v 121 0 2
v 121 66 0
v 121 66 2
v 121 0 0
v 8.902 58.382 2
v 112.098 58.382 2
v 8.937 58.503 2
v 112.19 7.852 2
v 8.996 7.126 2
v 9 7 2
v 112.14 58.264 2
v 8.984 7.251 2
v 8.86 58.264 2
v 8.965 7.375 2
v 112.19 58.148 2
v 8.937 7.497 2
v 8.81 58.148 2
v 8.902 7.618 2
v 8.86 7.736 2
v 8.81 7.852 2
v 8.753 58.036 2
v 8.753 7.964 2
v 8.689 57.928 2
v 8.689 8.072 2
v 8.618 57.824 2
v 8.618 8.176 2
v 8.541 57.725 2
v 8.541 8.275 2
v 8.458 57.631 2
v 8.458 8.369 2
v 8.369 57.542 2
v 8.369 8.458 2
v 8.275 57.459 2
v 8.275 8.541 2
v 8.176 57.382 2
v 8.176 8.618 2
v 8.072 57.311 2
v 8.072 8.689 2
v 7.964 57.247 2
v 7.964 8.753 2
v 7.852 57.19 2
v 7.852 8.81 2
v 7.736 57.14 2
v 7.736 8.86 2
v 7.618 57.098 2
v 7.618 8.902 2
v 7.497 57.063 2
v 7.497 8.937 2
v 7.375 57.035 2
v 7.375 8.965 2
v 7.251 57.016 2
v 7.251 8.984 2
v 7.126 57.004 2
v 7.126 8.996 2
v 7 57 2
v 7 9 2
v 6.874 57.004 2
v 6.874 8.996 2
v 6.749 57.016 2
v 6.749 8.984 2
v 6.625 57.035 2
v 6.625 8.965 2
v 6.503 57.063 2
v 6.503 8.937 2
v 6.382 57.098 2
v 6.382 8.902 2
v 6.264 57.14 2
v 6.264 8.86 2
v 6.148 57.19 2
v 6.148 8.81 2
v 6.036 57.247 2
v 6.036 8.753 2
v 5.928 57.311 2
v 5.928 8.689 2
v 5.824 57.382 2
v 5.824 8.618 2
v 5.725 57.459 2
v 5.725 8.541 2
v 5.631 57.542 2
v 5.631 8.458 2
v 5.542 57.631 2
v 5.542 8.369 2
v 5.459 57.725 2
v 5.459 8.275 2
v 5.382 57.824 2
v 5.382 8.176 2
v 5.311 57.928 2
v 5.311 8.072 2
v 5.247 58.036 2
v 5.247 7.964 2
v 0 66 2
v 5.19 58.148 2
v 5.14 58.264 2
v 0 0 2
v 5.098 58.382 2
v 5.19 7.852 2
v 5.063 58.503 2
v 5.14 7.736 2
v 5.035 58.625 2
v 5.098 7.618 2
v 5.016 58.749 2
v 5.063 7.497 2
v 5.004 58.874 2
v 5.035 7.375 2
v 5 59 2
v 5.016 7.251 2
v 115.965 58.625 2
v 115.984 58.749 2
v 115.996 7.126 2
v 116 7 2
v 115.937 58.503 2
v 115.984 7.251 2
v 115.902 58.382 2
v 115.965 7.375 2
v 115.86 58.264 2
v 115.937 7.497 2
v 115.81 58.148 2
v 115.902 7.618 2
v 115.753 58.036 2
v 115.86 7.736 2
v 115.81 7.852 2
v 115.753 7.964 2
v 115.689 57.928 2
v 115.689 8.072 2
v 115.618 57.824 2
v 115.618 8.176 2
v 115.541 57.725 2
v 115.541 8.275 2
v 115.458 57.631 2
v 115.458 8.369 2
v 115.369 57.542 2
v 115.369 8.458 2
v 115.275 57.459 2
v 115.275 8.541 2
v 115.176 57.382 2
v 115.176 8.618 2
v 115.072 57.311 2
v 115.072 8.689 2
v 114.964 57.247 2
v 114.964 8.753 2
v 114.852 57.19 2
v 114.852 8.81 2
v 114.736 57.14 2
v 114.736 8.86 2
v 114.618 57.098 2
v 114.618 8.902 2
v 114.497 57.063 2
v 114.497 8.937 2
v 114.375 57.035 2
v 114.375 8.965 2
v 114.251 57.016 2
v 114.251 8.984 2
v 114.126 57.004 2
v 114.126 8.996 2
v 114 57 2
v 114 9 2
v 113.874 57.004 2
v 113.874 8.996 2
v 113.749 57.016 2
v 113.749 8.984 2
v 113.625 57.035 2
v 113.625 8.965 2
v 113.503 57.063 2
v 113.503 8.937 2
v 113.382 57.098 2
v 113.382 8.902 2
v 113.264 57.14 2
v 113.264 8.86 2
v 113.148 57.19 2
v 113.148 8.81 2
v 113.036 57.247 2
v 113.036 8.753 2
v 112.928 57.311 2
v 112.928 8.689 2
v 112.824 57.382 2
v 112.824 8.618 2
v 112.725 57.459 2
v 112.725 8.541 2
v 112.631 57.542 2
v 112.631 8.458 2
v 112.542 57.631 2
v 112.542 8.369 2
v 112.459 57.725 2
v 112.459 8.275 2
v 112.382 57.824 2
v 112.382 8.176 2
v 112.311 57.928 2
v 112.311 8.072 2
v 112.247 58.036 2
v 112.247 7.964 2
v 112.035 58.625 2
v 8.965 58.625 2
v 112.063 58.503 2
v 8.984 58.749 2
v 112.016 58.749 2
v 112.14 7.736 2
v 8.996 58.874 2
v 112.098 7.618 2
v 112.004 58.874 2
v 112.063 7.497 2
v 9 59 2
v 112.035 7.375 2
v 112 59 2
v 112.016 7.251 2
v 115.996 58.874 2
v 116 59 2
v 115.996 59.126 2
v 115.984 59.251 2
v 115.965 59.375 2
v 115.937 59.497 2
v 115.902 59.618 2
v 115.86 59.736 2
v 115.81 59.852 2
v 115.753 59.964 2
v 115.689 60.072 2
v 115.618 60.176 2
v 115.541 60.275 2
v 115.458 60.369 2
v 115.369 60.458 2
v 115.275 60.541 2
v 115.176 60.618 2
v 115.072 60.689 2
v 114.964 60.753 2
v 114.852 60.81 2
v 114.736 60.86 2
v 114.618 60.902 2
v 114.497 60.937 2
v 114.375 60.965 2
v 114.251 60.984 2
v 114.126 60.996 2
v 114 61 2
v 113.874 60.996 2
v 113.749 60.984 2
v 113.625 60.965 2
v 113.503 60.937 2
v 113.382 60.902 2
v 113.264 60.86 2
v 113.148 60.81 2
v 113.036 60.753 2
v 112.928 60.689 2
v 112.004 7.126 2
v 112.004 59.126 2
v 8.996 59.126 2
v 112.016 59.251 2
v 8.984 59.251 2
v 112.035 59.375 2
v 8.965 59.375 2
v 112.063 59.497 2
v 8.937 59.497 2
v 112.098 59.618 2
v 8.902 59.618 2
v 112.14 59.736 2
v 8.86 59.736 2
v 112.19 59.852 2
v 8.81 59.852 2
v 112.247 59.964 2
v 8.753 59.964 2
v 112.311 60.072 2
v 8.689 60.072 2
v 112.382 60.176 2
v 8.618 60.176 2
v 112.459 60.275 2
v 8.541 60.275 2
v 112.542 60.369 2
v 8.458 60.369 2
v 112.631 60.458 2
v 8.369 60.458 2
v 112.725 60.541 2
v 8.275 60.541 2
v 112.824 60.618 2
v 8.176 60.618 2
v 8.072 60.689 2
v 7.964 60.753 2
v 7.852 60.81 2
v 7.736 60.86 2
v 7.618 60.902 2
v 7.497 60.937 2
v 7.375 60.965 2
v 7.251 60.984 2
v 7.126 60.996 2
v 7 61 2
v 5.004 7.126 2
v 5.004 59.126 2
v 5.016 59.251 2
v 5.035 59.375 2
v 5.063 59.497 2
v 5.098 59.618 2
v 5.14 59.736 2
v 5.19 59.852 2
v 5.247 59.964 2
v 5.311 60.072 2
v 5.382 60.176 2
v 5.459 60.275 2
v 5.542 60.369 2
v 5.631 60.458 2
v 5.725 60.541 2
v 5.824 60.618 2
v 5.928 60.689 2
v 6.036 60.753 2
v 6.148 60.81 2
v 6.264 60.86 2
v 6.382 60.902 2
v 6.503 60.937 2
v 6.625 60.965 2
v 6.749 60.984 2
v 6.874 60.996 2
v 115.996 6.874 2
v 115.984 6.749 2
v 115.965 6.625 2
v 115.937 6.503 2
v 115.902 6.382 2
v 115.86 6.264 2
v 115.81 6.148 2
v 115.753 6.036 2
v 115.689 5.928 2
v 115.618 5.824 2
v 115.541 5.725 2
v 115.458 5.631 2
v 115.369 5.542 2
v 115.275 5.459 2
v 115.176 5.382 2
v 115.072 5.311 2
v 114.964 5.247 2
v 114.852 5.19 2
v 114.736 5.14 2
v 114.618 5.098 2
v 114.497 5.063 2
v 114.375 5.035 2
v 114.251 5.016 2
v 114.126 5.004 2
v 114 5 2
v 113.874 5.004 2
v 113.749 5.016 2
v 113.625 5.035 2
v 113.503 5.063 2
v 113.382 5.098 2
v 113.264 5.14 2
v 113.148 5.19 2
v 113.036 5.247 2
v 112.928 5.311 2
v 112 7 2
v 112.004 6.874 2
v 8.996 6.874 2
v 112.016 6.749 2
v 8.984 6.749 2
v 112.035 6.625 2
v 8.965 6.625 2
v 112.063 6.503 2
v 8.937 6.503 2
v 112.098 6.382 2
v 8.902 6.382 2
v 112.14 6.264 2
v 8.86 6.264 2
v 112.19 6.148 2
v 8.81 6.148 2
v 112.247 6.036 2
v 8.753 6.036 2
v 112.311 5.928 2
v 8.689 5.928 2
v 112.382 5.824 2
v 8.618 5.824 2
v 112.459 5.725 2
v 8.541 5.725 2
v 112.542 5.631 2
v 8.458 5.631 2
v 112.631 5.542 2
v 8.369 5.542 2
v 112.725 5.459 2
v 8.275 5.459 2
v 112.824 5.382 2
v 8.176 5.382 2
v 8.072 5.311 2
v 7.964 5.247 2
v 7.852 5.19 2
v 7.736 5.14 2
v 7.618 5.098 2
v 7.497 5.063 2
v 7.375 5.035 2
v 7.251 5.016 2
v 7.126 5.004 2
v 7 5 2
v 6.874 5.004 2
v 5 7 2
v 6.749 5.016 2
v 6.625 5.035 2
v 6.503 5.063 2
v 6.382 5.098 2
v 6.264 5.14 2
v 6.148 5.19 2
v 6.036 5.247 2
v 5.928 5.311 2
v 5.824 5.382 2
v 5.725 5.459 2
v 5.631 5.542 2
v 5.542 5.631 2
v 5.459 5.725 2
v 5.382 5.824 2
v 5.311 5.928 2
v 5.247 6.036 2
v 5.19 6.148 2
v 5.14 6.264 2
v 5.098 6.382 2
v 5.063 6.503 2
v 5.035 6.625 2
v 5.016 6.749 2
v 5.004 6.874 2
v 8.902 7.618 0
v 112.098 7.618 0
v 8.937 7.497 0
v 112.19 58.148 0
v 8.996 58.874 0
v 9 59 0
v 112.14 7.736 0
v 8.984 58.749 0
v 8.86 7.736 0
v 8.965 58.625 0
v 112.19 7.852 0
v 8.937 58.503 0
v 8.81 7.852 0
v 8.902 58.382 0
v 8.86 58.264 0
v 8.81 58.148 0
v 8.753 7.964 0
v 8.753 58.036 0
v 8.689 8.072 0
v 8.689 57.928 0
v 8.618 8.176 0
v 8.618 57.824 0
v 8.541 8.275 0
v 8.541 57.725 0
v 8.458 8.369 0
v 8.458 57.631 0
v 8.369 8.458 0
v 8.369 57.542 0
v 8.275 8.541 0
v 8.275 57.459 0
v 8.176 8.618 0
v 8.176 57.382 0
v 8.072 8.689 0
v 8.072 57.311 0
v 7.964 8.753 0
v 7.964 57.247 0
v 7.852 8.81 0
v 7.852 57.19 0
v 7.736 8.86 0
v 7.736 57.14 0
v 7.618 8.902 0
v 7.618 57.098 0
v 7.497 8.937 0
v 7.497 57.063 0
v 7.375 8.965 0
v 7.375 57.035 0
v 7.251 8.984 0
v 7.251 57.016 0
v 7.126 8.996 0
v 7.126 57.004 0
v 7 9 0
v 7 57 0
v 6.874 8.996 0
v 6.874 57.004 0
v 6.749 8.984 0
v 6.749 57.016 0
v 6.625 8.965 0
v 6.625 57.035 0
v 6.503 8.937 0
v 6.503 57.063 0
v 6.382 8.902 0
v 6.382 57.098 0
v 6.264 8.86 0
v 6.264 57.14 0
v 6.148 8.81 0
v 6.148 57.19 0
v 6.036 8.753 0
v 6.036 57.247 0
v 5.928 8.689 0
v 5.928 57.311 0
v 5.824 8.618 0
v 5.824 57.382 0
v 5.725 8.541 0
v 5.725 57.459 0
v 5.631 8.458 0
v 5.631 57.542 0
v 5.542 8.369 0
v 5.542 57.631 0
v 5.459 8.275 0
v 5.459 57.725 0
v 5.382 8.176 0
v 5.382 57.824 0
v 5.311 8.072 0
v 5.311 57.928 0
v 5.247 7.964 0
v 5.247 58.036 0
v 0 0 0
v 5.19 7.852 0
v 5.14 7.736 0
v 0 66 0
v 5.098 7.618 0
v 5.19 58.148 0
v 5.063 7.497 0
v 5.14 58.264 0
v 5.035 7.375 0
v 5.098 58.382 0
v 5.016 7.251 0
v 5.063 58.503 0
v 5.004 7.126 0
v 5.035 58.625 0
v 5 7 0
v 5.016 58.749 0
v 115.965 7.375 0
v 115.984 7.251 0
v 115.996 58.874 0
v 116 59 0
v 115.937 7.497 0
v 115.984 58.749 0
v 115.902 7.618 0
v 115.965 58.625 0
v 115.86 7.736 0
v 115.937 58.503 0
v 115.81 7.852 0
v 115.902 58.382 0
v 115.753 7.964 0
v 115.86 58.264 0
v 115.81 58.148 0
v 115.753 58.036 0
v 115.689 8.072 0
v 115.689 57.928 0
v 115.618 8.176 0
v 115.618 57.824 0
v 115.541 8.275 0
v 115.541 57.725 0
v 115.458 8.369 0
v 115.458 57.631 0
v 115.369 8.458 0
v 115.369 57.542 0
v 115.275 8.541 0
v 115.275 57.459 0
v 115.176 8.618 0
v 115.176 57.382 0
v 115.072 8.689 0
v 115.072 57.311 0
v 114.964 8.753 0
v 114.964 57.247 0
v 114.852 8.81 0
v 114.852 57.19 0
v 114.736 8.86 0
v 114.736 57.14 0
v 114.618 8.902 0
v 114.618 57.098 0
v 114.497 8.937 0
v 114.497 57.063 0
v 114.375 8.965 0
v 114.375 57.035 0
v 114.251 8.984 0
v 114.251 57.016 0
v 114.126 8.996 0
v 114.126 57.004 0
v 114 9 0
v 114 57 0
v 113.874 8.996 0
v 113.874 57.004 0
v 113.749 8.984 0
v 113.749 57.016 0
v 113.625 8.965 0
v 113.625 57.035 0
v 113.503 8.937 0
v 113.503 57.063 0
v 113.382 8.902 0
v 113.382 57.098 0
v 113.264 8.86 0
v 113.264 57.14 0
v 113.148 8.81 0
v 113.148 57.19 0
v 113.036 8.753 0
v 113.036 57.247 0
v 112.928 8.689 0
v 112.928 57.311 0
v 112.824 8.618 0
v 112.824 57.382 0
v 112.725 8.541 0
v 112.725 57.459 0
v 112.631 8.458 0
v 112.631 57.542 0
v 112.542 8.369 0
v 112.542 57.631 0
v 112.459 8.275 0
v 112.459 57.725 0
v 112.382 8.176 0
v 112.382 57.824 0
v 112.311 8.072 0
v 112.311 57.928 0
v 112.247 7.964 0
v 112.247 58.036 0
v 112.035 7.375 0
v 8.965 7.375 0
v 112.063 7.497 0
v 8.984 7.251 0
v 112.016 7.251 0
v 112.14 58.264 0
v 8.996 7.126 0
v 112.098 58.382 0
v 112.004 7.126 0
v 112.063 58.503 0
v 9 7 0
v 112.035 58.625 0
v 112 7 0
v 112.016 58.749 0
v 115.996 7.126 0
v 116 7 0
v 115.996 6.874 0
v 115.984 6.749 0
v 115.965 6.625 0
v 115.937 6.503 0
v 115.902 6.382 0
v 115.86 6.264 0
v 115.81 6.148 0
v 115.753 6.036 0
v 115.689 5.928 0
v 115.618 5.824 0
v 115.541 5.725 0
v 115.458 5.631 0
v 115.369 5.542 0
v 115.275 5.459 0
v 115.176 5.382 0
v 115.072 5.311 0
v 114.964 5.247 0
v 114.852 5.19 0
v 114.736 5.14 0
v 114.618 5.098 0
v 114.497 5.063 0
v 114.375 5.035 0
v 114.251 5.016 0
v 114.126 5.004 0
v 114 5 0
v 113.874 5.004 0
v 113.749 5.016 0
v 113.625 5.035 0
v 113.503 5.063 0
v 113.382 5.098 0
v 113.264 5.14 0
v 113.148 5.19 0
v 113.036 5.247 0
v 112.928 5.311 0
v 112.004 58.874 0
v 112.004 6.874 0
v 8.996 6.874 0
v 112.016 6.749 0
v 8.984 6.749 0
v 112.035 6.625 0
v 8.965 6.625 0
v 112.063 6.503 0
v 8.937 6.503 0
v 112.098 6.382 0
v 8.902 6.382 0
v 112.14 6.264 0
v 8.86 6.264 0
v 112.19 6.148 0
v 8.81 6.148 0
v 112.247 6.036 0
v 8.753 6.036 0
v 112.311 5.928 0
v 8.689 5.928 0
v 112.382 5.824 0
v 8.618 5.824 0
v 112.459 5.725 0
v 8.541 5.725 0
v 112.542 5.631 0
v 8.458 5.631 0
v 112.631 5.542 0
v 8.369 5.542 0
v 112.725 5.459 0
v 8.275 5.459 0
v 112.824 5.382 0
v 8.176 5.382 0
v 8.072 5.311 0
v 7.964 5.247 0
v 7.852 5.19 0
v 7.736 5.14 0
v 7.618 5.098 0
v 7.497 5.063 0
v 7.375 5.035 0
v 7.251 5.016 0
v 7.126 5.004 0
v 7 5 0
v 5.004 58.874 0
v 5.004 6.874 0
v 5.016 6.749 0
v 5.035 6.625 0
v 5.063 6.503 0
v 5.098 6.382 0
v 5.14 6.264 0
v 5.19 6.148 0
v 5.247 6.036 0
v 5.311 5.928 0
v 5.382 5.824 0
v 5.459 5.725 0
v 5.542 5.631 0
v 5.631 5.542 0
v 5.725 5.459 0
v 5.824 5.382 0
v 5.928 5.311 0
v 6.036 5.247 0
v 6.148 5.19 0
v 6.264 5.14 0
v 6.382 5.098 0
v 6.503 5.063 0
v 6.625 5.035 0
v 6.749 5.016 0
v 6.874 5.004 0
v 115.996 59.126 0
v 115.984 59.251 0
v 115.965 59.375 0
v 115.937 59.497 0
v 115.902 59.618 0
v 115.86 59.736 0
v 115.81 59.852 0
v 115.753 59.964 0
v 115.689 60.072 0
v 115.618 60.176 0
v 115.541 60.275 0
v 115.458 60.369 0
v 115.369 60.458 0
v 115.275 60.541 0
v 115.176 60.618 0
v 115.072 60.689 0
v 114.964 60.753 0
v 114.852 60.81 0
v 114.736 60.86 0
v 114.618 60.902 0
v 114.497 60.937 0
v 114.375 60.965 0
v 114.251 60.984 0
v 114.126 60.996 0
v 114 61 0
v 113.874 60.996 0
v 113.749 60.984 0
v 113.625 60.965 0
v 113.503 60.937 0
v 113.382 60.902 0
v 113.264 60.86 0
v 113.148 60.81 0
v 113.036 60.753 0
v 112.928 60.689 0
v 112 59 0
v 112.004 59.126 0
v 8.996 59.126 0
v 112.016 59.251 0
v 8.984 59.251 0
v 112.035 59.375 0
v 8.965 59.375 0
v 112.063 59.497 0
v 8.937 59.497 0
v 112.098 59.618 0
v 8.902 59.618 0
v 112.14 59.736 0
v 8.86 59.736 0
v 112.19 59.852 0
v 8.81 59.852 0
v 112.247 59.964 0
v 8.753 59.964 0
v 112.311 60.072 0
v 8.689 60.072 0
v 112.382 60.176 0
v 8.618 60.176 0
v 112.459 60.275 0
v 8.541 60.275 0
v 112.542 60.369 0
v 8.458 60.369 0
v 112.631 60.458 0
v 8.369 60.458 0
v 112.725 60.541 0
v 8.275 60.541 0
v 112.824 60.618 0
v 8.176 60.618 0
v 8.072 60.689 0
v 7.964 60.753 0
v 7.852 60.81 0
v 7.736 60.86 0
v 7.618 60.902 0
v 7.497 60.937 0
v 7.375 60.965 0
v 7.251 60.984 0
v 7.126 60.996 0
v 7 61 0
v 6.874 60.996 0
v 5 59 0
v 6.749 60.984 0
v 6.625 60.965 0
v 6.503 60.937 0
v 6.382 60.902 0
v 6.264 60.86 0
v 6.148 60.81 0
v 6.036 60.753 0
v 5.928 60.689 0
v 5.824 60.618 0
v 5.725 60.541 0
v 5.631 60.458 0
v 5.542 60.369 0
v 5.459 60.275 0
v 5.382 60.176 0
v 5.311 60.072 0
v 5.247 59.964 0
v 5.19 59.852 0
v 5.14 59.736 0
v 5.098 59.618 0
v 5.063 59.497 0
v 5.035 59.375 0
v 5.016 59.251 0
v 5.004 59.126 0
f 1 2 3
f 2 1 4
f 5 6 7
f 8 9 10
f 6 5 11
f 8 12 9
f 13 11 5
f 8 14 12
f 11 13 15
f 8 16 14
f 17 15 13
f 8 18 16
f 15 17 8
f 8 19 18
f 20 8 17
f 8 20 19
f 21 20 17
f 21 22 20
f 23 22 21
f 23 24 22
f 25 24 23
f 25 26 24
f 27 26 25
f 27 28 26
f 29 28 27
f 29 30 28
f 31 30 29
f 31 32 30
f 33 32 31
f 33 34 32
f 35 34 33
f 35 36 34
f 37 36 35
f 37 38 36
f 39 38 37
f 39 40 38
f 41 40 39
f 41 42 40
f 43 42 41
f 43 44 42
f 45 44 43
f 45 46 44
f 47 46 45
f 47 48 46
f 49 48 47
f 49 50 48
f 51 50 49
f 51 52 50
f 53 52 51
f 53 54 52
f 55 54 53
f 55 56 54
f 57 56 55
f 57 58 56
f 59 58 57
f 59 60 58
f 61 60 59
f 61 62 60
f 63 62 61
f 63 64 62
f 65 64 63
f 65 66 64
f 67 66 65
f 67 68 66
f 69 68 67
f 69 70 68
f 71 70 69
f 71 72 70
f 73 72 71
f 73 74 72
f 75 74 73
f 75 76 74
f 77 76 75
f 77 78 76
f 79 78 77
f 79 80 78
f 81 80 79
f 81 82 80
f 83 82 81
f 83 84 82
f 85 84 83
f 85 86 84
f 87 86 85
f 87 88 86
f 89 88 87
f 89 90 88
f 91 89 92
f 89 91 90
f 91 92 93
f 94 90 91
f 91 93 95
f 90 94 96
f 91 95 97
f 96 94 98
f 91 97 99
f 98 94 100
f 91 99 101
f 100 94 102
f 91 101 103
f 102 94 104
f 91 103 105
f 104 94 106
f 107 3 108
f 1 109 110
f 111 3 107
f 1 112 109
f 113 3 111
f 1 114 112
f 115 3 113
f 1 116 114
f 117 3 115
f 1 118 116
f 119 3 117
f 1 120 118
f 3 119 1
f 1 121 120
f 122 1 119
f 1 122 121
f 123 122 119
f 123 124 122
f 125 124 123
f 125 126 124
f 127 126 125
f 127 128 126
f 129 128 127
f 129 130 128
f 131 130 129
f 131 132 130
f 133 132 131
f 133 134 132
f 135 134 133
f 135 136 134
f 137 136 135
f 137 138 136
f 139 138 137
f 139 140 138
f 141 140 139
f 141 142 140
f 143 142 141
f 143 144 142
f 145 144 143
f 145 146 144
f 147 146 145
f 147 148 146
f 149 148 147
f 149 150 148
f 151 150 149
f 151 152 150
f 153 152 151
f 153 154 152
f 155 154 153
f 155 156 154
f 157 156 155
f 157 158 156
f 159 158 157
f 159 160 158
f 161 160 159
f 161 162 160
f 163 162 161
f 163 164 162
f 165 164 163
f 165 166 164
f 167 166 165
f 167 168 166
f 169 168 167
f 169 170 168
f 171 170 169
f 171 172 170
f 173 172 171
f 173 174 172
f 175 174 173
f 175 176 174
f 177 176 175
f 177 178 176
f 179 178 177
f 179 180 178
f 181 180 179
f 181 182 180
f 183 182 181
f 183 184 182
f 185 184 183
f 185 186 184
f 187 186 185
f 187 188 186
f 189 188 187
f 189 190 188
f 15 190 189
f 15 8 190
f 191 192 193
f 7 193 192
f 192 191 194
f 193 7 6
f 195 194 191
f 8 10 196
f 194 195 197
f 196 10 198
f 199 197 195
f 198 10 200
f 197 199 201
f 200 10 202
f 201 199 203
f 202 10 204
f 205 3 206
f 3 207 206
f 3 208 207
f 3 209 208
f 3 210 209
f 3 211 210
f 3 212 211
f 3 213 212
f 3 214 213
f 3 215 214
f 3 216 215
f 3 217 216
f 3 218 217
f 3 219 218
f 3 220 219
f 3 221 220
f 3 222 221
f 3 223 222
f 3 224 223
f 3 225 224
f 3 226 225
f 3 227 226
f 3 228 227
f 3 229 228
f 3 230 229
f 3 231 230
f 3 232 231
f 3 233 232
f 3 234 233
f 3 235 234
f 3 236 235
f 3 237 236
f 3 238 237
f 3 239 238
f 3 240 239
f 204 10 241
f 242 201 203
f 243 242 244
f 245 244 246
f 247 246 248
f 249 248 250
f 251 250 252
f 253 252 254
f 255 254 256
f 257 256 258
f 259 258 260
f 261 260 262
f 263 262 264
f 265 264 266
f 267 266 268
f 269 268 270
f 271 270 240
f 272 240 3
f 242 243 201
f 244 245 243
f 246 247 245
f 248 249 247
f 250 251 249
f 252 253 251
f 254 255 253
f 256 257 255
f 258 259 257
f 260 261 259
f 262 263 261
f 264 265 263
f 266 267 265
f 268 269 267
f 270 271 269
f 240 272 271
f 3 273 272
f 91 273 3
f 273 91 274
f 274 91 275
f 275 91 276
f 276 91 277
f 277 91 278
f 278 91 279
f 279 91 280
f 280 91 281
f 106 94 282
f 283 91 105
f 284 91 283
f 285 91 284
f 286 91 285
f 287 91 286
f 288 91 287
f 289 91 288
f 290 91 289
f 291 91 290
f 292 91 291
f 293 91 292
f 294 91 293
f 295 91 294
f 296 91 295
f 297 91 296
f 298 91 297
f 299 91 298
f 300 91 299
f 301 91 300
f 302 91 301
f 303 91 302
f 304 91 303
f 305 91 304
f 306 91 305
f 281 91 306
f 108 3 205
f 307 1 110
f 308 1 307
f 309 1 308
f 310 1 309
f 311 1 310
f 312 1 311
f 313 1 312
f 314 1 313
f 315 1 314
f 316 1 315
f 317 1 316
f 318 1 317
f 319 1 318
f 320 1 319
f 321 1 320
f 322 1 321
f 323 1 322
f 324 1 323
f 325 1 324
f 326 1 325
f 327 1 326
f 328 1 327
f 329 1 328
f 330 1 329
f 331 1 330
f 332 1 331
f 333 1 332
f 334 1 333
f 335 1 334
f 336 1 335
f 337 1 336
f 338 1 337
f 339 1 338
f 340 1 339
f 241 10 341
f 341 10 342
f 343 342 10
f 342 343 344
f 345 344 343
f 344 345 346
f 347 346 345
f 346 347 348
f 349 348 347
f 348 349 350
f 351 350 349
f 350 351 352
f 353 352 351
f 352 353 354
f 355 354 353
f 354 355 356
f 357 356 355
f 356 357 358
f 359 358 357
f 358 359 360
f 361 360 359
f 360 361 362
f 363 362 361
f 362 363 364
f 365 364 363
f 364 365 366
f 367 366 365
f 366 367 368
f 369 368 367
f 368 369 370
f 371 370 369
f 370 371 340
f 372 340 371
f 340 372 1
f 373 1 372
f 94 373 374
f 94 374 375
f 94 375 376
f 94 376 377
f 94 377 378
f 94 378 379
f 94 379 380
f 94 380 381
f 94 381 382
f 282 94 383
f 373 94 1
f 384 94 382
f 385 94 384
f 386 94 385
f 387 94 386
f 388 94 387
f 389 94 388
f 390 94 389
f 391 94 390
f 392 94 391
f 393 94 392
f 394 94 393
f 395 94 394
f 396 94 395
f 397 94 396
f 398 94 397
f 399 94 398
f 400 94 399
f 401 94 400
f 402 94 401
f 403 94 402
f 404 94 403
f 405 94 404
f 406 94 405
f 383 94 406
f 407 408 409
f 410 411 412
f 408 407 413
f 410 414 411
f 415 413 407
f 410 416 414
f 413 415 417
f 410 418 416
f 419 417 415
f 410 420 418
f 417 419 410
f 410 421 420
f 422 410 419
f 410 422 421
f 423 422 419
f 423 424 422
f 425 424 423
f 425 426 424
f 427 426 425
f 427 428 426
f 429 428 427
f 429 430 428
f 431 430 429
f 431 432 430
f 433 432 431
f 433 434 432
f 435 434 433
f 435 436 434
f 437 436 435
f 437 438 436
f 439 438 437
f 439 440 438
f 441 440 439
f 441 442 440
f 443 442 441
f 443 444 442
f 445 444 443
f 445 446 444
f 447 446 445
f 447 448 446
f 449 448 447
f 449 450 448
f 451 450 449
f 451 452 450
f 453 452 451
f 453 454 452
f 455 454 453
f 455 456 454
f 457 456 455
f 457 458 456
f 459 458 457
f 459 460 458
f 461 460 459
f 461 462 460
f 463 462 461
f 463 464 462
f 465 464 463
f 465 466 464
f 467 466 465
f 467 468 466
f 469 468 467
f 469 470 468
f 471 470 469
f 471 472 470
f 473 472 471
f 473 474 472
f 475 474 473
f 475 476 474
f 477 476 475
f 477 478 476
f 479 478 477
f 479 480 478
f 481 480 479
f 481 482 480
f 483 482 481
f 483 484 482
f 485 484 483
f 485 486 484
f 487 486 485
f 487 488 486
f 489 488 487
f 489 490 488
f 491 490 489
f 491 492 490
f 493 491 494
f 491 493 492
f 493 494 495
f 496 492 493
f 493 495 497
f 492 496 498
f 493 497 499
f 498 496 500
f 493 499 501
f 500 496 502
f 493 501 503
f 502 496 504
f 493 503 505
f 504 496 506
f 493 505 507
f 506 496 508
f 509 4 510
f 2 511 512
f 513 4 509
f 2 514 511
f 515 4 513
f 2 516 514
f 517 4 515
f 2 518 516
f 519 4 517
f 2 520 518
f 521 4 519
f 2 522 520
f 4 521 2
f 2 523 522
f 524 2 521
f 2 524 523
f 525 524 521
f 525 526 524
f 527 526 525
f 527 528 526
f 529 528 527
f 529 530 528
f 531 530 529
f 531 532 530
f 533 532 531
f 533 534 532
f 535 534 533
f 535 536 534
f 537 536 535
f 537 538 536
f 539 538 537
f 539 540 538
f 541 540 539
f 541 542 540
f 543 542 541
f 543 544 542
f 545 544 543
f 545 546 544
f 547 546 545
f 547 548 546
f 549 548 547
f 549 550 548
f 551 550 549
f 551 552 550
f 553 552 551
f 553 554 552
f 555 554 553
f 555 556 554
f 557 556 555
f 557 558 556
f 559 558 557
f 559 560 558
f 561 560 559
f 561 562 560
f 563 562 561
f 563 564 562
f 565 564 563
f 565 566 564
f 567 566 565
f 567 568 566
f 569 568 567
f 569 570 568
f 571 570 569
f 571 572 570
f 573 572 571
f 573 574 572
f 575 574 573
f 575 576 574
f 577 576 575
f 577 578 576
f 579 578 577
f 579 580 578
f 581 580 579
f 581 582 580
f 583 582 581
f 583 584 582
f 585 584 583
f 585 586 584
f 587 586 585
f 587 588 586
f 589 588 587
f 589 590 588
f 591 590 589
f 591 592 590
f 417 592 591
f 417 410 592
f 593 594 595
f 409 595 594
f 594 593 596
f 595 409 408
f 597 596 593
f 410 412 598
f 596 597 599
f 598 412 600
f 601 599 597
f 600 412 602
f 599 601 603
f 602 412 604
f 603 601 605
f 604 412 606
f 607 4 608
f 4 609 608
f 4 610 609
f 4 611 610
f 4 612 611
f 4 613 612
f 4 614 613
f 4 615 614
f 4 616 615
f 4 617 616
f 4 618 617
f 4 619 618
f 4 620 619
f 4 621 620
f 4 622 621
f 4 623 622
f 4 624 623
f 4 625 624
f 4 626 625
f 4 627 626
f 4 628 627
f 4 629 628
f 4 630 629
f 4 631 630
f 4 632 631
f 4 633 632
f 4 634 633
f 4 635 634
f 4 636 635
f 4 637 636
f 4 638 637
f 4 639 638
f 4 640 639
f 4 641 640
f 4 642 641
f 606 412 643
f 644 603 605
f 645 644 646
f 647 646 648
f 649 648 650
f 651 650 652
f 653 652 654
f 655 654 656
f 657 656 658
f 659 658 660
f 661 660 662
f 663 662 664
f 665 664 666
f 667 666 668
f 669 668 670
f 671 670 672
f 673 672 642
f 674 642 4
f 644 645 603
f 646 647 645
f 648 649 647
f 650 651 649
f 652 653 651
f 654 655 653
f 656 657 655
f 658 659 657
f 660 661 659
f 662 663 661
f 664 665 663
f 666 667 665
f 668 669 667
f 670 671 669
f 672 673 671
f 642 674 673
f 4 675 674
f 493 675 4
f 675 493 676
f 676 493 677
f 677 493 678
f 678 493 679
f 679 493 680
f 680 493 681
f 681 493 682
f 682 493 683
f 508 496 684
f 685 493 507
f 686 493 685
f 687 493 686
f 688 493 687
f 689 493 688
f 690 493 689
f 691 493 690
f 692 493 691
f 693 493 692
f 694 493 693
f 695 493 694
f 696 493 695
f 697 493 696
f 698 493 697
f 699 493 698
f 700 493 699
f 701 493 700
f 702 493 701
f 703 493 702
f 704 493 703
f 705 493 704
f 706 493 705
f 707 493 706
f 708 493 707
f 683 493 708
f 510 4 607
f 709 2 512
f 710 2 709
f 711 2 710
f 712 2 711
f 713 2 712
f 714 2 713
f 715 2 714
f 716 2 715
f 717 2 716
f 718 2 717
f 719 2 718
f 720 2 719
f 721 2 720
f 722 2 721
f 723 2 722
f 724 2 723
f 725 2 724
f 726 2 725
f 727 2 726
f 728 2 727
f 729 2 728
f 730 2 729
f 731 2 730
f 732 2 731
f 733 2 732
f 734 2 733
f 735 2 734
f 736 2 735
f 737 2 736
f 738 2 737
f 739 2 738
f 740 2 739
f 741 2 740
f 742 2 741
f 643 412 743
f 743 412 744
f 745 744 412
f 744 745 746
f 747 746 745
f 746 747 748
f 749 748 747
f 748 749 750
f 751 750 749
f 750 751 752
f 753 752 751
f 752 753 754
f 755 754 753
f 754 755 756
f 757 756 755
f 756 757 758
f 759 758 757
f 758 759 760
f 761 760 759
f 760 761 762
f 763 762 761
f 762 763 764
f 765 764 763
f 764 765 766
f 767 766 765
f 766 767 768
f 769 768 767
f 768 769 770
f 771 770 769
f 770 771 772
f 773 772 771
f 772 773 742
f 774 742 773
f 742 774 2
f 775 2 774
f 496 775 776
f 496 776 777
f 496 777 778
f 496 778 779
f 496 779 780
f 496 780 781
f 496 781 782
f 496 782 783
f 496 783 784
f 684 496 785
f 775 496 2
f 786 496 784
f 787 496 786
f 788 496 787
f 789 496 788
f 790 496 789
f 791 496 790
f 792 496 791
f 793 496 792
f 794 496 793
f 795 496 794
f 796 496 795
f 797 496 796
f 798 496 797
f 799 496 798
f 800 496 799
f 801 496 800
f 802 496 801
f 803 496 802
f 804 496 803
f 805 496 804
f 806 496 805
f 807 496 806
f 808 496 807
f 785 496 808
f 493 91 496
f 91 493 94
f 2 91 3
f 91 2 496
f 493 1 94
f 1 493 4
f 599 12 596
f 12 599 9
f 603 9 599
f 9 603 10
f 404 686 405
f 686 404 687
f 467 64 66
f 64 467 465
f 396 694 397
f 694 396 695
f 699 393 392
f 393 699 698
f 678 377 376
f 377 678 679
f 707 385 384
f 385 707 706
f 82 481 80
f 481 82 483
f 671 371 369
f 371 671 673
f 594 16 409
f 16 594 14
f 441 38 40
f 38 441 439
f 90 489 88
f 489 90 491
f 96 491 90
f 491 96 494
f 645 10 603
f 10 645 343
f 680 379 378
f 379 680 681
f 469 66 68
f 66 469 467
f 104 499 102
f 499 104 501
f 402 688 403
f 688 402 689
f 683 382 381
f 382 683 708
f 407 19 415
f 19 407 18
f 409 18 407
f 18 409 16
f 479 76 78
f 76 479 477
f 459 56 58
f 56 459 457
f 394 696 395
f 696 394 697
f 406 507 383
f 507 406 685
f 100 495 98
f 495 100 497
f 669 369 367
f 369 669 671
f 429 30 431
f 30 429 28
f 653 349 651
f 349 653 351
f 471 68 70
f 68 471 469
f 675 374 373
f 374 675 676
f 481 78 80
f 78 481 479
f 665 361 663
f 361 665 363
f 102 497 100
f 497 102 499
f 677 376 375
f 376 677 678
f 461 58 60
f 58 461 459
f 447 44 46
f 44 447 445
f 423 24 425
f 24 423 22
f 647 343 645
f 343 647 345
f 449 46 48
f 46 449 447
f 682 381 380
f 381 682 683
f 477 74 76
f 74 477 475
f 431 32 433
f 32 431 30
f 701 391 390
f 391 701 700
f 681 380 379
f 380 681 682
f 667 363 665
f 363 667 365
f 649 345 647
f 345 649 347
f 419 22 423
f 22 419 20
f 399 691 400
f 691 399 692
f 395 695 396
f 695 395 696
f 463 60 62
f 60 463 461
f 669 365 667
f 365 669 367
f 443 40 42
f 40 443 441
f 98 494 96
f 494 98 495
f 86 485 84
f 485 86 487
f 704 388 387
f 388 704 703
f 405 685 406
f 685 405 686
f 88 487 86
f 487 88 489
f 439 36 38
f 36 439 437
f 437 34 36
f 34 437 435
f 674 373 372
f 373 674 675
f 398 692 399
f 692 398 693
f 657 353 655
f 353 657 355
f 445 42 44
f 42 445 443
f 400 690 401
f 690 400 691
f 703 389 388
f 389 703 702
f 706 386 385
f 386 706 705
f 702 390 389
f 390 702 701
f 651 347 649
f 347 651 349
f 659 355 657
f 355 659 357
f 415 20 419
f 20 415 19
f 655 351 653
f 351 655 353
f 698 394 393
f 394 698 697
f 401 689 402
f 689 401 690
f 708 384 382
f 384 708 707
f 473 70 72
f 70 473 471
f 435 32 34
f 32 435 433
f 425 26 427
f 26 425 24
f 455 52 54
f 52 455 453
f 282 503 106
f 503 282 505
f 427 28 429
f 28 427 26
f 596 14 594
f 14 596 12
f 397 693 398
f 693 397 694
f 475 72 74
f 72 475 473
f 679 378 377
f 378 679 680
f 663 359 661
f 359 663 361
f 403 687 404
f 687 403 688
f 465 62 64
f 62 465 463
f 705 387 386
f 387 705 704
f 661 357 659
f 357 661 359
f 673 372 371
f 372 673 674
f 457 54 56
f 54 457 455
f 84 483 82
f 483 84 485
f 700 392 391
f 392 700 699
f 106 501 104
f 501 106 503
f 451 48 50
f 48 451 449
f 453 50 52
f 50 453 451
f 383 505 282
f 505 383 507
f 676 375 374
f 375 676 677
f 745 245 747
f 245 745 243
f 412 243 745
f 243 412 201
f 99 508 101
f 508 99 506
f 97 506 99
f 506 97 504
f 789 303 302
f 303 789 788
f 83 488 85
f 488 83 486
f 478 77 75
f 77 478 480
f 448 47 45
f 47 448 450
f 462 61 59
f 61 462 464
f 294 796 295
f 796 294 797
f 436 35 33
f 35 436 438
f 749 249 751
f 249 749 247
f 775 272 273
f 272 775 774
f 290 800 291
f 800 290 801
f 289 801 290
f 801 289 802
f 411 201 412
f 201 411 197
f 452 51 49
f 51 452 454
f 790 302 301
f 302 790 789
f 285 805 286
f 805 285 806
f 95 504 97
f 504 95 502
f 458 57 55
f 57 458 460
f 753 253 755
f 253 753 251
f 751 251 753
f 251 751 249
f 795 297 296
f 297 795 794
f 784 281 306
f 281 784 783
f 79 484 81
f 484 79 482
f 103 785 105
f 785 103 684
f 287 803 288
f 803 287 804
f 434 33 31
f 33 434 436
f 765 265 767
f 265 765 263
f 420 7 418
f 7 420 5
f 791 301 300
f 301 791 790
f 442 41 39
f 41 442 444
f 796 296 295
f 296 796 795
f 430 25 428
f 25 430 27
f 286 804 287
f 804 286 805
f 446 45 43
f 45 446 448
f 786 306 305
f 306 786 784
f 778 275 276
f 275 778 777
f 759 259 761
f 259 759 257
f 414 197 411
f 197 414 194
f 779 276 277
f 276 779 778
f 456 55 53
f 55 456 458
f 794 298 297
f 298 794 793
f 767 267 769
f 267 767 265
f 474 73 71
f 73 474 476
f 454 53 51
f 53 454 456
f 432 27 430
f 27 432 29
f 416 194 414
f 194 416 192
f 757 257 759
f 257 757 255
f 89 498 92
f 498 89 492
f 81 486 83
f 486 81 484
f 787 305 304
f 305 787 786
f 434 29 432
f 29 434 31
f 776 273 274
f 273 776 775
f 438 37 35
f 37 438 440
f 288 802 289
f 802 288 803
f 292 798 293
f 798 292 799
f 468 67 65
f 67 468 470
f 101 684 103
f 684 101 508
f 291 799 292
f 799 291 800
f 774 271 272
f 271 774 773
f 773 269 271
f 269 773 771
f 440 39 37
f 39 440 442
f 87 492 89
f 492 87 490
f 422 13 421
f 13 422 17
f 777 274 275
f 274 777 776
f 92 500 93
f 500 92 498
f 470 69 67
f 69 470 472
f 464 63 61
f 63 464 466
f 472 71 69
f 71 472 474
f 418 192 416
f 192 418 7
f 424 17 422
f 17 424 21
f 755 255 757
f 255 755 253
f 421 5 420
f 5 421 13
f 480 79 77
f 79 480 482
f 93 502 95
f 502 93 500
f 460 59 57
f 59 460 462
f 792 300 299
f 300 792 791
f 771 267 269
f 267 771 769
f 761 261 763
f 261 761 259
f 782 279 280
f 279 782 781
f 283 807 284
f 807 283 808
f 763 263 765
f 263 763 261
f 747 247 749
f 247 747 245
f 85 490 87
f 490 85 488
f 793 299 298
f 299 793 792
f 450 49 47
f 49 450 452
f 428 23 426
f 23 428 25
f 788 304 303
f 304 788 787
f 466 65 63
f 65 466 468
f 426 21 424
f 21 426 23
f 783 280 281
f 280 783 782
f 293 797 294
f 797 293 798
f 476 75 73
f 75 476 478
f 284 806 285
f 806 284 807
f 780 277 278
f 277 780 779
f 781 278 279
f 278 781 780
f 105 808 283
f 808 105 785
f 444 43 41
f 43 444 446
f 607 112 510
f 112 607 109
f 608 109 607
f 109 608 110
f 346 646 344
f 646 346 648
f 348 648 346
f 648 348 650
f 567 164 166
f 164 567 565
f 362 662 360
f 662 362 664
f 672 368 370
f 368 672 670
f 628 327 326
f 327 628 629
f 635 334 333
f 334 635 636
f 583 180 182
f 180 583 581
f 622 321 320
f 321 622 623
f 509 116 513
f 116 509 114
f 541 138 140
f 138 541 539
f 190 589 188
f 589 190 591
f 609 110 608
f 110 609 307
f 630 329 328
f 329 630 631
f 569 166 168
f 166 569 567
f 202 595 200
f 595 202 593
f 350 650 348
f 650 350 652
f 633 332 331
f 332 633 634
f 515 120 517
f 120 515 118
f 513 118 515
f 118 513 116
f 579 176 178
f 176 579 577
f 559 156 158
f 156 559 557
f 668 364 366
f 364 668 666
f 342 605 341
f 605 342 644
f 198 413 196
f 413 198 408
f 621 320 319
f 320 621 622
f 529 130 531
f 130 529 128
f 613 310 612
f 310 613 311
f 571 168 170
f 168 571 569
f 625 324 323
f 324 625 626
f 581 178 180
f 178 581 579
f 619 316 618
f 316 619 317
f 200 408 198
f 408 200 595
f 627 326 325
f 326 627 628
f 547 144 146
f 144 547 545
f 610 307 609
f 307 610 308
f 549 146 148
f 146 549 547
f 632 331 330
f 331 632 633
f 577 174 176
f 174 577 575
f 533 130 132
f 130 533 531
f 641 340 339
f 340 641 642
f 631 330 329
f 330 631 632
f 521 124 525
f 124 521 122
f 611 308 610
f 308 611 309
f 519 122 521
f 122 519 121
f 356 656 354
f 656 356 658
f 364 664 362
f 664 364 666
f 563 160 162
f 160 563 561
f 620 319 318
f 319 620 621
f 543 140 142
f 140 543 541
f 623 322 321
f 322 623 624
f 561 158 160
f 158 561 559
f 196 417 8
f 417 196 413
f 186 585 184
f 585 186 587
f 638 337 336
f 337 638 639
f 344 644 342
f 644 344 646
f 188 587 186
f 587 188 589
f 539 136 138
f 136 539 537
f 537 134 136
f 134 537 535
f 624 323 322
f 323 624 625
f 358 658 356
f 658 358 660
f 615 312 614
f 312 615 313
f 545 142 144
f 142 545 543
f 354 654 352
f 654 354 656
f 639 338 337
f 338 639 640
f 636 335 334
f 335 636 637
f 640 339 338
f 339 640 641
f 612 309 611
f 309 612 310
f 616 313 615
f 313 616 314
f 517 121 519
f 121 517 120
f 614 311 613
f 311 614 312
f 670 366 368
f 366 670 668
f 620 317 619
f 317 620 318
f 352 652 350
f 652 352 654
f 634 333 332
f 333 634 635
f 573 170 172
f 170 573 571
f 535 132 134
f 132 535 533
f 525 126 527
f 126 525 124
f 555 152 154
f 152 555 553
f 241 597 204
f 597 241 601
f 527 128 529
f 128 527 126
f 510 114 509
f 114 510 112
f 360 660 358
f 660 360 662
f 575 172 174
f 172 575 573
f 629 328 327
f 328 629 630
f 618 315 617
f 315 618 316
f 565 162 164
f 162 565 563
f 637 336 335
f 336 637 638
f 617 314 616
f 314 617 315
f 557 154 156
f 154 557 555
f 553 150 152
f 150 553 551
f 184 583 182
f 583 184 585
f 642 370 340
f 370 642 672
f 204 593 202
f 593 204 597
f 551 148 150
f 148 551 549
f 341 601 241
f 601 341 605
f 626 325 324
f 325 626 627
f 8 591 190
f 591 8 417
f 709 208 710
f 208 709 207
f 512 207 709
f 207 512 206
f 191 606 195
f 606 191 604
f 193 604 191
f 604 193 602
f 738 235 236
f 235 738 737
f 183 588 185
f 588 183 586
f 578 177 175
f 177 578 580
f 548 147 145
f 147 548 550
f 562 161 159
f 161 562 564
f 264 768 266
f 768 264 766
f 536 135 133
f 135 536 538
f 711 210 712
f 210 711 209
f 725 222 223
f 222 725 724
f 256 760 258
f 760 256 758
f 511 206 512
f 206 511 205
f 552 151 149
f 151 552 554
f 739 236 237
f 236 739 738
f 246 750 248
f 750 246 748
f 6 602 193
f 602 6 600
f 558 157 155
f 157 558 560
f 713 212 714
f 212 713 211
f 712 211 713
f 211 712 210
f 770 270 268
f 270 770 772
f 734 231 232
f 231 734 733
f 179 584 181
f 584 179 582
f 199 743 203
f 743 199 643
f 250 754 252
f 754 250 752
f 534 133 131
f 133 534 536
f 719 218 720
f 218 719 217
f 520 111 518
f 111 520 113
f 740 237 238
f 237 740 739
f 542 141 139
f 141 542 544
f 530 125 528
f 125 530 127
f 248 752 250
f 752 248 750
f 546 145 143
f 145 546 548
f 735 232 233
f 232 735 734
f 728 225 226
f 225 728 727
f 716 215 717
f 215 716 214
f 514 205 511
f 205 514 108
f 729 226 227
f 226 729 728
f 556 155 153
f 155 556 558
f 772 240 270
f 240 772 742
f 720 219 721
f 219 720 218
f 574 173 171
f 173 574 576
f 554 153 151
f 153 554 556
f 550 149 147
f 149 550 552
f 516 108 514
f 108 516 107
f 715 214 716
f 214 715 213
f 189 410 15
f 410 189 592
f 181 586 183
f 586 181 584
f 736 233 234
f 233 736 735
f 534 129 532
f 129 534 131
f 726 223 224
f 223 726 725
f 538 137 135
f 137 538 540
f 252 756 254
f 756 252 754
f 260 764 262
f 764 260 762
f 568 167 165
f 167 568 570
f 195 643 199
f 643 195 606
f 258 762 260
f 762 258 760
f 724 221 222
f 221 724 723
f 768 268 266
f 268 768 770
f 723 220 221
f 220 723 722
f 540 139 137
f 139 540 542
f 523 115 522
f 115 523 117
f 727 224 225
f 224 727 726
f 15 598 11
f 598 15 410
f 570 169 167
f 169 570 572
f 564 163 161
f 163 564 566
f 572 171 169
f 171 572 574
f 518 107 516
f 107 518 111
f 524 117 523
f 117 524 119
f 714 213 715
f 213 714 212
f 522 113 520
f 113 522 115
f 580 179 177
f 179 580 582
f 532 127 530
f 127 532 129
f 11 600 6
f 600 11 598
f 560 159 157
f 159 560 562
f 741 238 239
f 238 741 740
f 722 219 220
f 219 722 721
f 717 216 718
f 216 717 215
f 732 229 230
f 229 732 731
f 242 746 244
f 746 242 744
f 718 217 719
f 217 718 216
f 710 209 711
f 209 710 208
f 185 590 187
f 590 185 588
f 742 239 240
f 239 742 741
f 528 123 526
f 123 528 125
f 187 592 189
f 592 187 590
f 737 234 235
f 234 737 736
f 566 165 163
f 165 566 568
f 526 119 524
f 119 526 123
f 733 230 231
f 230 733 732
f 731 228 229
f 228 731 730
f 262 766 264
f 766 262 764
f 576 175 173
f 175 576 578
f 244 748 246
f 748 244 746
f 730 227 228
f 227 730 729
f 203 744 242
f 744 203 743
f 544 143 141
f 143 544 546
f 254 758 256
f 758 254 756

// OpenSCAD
thickness = 2;
margin = 7;
$fn = 100;

hor_gap = 107;
ver_gap = 52;
m4_rad = 4/2;

difference()
{
    cube([margin + hor_gap + margin, margin + ver_gap + margin, thickness]);
    
    translate([margin, margin, 0])
    {
        cylinder(h = thickness, r = m4_rad);
    }
    
    translate([margin, margin + ver_gap, 0])
    {
        cylinder(h = thickness, r = m4_rad);
    }
    
    translate([margin + hor_gap, margin, 0])
    {
        cylinder(h = thickness, r = m4_rad);
    }
    
    translate([margin + hor_gap, margin + ver_gap, 0])
    {
        cylinder(h = thickness, r = m4_rad);
    }
}
